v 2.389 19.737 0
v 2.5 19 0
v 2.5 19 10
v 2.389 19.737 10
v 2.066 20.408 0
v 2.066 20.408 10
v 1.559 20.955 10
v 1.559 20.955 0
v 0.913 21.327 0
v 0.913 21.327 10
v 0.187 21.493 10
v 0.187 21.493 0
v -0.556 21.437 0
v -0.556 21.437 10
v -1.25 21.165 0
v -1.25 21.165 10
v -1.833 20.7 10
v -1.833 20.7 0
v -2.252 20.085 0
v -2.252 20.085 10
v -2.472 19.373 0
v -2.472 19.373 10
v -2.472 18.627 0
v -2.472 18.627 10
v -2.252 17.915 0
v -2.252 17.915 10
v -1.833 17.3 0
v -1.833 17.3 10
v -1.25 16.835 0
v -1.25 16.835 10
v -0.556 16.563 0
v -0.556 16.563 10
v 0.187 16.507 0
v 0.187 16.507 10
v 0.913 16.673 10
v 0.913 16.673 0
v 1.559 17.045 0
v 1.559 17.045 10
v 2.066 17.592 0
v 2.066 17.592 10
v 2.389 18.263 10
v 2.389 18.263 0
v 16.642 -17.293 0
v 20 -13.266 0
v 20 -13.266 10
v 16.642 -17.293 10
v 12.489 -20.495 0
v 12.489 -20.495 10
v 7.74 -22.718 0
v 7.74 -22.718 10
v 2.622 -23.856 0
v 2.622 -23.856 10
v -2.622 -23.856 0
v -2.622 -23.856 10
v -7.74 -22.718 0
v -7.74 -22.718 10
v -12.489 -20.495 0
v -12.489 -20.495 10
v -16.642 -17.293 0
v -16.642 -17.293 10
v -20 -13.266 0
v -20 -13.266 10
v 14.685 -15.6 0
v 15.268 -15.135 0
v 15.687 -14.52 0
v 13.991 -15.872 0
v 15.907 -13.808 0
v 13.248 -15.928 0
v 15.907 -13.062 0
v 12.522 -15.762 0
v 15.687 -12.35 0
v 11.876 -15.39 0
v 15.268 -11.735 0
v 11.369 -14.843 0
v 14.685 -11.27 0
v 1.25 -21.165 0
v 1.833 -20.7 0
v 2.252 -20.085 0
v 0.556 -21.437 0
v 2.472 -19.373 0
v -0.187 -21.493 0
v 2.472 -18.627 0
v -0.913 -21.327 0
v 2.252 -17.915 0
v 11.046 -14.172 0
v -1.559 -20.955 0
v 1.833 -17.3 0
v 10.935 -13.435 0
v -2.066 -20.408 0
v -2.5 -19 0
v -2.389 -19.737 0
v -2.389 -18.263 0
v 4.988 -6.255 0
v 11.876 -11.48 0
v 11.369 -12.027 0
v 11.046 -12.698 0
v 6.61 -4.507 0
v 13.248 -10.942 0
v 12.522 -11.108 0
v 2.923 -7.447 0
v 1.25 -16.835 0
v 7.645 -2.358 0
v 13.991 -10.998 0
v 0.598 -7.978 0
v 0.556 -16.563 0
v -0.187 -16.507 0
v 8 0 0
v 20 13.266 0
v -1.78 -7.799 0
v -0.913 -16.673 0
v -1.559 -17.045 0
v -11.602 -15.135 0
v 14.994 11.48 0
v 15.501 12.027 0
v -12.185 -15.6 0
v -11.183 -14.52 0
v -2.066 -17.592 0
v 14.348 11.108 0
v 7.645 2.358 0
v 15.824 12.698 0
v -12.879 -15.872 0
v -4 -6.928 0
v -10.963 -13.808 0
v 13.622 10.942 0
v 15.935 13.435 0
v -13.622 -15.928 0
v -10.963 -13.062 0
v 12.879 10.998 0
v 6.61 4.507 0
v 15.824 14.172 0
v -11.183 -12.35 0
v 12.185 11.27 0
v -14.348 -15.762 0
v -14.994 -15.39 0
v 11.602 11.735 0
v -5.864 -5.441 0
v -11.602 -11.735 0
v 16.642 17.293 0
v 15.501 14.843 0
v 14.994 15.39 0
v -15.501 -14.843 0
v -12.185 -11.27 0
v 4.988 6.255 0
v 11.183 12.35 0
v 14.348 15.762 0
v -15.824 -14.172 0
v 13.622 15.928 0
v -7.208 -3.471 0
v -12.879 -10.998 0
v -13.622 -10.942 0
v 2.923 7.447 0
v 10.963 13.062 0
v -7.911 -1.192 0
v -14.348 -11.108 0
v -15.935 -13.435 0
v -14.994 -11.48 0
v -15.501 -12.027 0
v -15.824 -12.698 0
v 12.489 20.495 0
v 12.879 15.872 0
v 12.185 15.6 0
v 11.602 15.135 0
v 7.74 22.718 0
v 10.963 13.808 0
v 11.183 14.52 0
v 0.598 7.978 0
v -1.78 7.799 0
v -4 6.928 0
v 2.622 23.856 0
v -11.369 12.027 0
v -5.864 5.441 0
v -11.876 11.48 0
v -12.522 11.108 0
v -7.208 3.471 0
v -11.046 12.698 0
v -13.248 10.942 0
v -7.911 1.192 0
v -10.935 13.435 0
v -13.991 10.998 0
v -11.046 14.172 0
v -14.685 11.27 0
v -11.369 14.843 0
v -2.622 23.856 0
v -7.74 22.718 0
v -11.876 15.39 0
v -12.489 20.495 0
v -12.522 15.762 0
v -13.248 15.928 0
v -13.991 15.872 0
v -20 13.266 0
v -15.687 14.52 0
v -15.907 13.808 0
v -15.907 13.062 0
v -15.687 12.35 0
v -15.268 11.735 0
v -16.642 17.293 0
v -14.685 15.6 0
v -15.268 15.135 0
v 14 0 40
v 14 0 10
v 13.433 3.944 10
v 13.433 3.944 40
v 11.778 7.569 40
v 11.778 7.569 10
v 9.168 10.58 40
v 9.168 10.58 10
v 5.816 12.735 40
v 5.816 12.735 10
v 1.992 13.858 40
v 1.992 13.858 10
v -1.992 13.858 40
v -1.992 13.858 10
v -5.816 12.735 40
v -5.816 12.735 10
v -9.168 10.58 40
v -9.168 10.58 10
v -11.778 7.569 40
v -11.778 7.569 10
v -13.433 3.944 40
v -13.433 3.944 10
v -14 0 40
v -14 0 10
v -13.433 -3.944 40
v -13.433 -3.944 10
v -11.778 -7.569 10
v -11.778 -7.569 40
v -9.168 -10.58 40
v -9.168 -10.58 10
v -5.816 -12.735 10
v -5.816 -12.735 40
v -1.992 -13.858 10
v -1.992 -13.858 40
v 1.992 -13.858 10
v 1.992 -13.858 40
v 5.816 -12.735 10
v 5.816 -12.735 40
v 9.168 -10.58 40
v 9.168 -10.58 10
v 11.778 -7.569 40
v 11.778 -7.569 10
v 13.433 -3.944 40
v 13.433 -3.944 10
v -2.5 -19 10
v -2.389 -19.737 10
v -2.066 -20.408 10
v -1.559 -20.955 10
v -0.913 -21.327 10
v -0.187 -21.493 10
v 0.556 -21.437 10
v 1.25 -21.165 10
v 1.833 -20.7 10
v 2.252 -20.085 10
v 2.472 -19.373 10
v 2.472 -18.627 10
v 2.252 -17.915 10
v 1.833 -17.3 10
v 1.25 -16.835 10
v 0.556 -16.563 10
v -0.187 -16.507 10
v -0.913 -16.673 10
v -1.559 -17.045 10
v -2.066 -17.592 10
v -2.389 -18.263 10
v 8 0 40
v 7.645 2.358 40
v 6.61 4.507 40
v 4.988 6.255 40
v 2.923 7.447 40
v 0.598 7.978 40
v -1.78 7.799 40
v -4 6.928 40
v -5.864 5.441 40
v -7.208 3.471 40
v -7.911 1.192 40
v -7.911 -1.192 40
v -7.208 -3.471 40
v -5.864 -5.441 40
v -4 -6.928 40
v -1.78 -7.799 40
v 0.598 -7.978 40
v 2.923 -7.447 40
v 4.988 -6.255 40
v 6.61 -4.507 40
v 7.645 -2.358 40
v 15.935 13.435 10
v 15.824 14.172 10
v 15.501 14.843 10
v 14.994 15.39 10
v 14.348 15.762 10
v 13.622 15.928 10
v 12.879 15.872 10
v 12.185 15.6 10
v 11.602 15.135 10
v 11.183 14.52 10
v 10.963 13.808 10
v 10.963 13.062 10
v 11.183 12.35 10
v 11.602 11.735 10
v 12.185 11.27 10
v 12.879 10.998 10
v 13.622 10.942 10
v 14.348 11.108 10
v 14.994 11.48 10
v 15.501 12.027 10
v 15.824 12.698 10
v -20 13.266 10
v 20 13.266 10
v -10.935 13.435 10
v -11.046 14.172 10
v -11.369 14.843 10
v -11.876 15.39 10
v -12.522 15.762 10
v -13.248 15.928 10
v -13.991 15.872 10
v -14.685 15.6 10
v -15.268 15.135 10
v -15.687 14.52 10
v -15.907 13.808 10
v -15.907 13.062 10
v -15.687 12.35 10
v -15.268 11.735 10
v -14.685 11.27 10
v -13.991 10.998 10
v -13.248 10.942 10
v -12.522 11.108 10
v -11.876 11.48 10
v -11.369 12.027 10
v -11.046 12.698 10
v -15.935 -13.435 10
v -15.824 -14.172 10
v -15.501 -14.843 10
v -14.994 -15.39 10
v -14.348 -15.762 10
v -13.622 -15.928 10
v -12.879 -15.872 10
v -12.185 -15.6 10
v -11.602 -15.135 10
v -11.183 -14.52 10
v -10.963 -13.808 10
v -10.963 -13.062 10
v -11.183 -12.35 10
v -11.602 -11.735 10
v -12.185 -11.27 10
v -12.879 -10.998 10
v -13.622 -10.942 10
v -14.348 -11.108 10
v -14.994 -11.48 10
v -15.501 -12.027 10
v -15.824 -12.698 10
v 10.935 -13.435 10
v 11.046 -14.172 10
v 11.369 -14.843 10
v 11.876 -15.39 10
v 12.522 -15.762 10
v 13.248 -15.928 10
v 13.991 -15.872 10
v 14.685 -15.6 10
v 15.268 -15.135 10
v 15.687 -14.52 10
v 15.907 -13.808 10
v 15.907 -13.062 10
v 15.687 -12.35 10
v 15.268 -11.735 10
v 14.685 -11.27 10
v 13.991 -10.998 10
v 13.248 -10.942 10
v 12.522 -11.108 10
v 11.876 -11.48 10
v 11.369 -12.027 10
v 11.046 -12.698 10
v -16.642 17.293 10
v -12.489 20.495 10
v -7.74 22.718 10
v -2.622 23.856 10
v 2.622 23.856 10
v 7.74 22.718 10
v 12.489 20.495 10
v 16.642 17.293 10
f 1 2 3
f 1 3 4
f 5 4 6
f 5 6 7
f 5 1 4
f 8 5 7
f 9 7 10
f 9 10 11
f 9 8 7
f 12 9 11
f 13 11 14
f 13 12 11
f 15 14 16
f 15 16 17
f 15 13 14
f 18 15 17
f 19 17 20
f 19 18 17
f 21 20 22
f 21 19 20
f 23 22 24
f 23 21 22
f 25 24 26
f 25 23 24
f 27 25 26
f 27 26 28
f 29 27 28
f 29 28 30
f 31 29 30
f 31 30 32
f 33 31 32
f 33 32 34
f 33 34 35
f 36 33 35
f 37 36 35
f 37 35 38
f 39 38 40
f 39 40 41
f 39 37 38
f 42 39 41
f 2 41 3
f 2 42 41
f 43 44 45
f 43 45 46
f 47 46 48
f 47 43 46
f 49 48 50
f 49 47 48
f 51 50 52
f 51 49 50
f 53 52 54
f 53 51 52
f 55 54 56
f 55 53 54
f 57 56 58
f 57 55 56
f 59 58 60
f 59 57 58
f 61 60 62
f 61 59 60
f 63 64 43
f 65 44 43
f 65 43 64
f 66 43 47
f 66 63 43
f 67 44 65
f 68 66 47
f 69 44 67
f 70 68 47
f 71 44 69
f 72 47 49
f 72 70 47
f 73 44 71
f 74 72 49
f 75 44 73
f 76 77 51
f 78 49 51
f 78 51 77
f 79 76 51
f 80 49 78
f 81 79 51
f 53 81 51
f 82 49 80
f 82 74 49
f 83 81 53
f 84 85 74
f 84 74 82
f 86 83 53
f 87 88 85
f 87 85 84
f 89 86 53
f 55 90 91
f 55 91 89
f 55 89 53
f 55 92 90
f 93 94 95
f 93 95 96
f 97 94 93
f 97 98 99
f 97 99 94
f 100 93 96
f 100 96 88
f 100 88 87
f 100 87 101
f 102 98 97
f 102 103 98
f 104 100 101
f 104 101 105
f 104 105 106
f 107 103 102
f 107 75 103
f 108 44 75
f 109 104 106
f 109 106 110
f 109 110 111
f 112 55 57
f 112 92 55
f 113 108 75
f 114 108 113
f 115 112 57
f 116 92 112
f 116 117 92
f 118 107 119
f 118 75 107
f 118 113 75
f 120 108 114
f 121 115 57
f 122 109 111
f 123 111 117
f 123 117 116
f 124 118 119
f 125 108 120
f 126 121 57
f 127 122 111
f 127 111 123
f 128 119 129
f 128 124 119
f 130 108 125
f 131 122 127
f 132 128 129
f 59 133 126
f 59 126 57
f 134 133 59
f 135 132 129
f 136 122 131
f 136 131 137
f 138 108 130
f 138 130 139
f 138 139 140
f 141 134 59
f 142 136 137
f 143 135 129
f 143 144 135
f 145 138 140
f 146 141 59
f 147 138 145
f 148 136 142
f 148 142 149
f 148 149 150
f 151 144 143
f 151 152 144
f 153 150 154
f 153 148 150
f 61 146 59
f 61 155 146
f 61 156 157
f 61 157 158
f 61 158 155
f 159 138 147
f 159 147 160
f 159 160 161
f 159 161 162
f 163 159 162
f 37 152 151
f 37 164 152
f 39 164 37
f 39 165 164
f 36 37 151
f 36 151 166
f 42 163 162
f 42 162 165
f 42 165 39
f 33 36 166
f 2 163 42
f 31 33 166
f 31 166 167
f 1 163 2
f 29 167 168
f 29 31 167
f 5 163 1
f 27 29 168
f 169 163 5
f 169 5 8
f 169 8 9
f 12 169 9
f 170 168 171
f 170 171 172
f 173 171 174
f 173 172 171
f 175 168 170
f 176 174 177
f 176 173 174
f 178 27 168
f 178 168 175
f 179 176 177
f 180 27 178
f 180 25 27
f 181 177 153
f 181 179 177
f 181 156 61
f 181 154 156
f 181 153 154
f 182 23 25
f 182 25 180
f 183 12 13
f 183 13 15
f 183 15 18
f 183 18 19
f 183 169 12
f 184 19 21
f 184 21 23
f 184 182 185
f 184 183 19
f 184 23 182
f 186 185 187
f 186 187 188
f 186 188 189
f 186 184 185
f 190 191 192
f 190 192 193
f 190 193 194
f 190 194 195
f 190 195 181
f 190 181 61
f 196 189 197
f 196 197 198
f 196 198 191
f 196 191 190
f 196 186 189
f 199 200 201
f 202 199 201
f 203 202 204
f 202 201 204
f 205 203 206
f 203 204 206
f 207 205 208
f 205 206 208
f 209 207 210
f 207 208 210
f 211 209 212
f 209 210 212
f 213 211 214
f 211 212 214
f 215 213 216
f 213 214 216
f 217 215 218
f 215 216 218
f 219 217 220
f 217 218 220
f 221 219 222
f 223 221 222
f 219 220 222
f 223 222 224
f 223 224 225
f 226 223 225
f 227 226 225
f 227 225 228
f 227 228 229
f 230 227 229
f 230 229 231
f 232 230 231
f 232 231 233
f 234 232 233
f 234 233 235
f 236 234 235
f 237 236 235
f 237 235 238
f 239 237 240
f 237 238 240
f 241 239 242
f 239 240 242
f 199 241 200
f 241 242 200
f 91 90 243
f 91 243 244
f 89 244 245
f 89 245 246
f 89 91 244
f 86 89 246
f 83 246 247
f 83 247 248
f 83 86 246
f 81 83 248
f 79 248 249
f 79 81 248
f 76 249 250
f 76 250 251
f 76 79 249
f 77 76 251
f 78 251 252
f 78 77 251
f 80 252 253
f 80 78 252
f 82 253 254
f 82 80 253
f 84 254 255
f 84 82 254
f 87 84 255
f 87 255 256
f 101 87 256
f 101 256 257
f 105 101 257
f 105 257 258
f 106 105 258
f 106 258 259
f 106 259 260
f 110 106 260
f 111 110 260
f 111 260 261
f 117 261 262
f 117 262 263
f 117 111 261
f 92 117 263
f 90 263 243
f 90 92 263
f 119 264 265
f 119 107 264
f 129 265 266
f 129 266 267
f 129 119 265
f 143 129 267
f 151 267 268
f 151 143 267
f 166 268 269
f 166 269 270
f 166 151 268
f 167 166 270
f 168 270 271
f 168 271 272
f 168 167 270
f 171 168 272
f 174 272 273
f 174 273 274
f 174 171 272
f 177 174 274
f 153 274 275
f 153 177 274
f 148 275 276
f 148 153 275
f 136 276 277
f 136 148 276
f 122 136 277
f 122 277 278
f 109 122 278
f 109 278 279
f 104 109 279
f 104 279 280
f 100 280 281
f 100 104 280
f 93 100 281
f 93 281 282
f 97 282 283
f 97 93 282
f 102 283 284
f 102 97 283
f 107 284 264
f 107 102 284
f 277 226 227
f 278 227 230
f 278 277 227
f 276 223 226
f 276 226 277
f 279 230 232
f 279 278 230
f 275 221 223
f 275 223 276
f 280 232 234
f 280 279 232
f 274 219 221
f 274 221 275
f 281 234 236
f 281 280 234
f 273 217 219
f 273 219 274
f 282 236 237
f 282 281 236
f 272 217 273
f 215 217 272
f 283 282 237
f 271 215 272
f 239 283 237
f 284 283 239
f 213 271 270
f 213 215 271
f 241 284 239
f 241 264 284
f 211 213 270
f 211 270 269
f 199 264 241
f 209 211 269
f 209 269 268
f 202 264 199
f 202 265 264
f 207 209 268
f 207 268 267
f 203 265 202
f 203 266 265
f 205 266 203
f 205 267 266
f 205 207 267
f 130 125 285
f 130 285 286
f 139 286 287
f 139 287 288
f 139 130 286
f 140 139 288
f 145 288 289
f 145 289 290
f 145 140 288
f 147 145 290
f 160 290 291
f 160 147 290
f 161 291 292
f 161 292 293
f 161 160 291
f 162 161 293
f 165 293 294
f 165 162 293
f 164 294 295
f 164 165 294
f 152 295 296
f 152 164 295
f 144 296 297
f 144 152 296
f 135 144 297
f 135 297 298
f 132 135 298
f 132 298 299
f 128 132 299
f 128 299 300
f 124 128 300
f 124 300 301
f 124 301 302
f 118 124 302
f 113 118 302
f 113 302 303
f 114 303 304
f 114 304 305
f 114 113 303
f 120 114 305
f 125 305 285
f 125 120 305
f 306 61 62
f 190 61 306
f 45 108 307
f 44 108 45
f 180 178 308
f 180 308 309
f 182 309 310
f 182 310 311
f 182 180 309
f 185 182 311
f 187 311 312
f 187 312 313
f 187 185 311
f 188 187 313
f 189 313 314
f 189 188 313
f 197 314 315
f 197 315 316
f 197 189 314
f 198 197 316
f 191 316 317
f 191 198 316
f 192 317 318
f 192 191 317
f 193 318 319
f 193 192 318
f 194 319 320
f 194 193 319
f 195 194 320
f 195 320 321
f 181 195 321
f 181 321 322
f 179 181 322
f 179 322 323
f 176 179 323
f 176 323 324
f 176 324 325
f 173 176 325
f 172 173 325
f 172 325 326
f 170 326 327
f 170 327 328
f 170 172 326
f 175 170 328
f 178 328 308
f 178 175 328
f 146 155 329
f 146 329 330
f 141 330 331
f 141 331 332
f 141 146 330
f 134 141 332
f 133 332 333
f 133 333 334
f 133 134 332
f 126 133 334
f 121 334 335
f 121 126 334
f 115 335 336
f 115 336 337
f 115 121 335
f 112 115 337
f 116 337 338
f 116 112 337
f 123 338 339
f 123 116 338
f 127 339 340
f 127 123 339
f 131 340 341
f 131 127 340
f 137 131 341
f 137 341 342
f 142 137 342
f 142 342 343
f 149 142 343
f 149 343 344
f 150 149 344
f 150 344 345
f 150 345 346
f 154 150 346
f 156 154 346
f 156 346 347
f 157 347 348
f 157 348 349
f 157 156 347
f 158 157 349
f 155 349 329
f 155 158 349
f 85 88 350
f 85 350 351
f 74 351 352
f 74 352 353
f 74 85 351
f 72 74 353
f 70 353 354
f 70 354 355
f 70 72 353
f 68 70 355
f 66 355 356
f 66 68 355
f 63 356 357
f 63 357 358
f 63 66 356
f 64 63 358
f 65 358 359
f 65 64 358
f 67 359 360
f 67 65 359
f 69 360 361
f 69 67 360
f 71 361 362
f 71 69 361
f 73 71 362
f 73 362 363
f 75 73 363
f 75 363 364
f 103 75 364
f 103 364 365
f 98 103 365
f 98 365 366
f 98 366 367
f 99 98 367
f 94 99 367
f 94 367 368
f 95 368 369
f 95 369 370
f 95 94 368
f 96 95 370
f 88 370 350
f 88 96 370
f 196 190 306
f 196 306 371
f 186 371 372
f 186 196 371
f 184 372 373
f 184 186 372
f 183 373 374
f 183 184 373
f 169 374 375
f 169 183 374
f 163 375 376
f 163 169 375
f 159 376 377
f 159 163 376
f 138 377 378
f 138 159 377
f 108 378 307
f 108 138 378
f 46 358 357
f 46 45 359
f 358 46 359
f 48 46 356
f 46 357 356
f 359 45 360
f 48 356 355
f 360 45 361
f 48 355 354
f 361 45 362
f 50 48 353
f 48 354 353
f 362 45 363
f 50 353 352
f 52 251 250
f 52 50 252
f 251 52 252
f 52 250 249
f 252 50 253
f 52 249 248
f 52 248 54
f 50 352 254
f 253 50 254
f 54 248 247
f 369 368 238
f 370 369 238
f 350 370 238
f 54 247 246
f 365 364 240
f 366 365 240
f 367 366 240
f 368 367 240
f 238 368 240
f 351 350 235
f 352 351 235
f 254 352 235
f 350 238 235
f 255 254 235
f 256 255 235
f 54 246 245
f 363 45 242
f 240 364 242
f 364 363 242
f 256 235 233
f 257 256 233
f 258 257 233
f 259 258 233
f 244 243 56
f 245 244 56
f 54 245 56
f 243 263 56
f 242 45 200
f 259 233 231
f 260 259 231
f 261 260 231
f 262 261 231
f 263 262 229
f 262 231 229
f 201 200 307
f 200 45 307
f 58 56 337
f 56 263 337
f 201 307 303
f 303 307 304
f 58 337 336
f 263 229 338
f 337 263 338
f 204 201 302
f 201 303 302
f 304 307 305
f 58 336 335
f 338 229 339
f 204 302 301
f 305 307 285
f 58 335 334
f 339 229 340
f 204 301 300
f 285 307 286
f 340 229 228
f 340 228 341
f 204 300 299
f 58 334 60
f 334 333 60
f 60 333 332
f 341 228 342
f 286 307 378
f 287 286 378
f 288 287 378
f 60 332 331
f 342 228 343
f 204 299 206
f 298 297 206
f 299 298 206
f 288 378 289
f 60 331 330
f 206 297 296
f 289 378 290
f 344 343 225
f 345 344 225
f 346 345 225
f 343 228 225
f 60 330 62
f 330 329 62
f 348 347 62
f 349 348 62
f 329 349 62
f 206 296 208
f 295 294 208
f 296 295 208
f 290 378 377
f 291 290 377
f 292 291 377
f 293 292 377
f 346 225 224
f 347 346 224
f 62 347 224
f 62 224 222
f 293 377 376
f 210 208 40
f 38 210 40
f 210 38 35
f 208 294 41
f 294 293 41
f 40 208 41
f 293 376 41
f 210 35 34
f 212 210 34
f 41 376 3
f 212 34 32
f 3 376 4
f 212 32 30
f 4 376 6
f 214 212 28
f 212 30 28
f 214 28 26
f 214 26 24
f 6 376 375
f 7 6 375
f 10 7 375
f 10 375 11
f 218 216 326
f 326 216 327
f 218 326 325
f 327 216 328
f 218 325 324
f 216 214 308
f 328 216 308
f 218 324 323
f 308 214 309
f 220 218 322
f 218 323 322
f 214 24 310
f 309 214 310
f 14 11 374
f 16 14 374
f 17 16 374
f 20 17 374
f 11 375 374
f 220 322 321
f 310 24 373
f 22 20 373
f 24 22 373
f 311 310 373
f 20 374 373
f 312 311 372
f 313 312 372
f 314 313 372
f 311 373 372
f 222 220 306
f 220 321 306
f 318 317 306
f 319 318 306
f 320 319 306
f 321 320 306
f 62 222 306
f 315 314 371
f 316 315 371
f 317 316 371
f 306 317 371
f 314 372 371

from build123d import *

# Parameters (mm, degrees)
SKETCH_1_R      = 2.5
SKETCH_1_R_2    = 8
EXTRUDE_1_DEPTH = 10
SKETCH_2_R      = 14
SKETCH_2_R_2    = 8
EXTRUDE_2_DEPTH = 30


with BuildPart() as part:
    # 草图1 → 凸台-拉伸1 (new body)
    with BuildSketch(Plane.XY):
        with BuildLine():
            Line((20, 13.266499161), (20, -13.266499161))
            ThreePointArc((20, -13.266499161), (0, -24), (-20, -13.266499161))
            Line((-20, -13.266499161), (-20, 13.266499161))
            ThreePointArc((-20, 13.266499161), (0, 24), (20, 13.266499161))
        make_face()
        with Locations((0, 19)):
            Circle(SKETCH_1_R, mode=Mode.SUBTRACT)
        with Locations((13.435028843, 13.435028843)):
            Circle(SKETCH_1_R, mode=Mode.SUBTRACT)
        with Locations((-13.435028843, 13.435028843)):
            Circle(SKETCH_1_R, mode=Mode.SUBTRACT)
        with Locations(Location((0, -19, 0), (0, 0, 180))):
            Circle(SKETCH_1_R, mode=Mode.SUBTRACT)
        with Locations(Location((-13.435028843, -13.435028843, 0), (0, 0, 180))):
            Circle(SKETCH_1_R, mode=Mode.SUBTRACT)
        with Locations(Location((13.435028843, -13.435028843, 0), (0, 0, 180))):
            Circle(SKETCH_1_R, mode=Mode.SUBTRACT)
        Circle(SKETCH_1_R_2, mode=Mode.SUBTRACT)
    extrude(amount=EXTRUDE_1_DEPTH)

    # 草图2 → 凸台-拉伸2 (add)
    with BuildSketch(Plane.XY.offset(10)):
        Circle(SKETCH_2_R)
        Circle(SKETCH_2_R_2, mode=Mode.SUBTRACT)
    extrude(amount=EXTRUDE_2_DEPTH)


solid = part.part
